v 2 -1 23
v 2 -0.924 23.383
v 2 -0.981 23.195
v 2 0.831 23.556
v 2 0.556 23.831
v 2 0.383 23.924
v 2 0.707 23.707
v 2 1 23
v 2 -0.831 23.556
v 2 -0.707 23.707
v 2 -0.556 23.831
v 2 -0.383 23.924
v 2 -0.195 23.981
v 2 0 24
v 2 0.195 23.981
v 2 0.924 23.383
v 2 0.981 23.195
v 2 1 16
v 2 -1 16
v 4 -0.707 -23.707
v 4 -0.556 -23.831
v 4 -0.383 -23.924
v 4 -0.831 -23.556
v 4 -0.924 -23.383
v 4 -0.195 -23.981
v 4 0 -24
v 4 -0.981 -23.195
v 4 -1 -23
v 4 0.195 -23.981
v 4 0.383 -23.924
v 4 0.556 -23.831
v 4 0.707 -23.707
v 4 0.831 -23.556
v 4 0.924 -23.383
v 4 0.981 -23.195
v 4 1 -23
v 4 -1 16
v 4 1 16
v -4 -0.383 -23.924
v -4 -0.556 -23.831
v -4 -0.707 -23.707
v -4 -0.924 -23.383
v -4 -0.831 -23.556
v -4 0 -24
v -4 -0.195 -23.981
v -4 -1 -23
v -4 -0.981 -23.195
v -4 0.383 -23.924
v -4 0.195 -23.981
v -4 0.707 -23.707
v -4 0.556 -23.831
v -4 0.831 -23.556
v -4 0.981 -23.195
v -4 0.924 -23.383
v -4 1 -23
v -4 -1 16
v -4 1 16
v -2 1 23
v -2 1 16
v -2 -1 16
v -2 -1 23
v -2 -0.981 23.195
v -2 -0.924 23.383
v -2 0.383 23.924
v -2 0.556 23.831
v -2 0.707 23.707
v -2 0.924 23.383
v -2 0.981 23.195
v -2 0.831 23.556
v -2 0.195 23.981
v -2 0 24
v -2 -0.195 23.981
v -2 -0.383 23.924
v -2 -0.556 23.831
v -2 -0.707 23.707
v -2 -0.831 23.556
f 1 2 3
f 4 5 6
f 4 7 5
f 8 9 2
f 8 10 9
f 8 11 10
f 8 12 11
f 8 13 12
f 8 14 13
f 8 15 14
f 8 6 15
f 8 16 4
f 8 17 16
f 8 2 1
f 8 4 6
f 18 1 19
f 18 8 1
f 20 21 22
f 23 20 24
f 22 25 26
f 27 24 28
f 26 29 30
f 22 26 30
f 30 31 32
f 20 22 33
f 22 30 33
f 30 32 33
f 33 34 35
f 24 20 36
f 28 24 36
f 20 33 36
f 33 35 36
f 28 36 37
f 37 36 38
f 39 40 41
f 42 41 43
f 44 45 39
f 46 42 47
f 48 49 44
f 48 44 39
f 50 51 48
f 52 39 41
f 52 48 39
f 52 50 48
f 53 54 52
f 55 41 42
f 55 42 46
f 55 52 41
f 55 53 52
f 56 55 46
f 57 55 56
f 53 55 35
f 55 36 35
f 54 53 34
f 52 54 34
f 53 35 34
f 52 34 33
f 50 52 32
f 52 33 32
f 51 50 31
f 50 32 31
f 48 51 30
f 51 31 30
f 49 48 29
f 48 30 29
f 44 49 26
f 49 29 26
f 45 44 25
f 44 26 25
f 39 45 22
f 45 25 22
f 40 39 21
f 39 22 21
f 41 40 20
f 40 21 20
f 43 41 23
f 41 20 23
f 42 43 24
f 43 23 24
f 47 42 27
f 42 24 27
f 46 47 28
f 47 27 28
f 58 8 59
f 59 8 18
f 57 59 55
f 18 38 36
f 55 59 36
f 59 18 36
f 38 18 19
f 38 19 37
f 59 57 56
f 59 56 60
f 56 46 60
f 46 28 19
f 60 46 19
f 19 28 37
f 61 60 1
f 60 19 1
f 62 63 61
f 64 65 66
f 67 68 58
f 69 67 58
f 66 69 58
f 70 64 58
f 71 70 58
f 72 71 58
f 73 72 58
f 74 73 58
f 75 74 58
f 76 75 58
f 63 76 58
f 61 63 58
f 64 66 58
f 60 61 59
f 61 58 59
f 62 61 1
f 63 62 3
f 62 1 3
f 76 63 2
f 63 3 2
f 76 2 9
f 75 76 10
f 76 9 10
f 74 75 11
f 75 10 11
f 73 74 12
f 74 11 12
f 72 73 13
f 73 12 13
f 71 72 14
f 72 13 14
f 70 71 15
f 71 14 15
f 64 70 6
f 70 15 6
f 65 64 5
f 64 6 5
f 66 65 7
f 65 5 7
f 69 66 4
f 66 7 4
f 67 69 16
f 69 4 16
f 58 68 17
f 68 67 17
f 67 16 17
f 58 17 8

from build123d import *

# Parameters (mm, degrees)
EXTRUDE_1_DEPTH     = 4
SKETCH_5_W          = 2
SKETCH_5_H          = 8
CUT_EXTRUDE_2_DEPTH = 10


with BuildPart() as part:
    # 草图1 → 凸台-拉伸1 (new body, symmetric)
    with BuildSketch(Plane(origin=(0, 0, 0), x_dir=(0, 0, -1), z_dir=(1, 0, 0))):
        with BuildLine():
            Line((-23, 1), (23, 1))
            ThreePointArc((23, 1), (24, 0), (23, -1))
            Line((23, -1), (-23, -1))
            ThreePointArc((-23, -1), (-24, 0), (-23, 1))
        make_face()
    extrude(amount=EXTRUDE_1_DEPTH, both=True)

    # 草图5 → 切除-拉伸2 (cut)
    with BuildSketch(Plane(origin=(0, 1, 0), x_dir=(1, 0, 0), z_dir=(0, 1, 0))):
        with Locations((-3, -20)):
            Rectangle(SKETCH_5_W, SKETCH_5_H)
        with Locations((3, -20)):
            Rectangle(SKETCH_5_W, SKETCH_5_H)
    extrude(amount=-CUT_EXTRUDE_2_DEPTH, mode=Mode.SUBTRACT)


solid = part.part
